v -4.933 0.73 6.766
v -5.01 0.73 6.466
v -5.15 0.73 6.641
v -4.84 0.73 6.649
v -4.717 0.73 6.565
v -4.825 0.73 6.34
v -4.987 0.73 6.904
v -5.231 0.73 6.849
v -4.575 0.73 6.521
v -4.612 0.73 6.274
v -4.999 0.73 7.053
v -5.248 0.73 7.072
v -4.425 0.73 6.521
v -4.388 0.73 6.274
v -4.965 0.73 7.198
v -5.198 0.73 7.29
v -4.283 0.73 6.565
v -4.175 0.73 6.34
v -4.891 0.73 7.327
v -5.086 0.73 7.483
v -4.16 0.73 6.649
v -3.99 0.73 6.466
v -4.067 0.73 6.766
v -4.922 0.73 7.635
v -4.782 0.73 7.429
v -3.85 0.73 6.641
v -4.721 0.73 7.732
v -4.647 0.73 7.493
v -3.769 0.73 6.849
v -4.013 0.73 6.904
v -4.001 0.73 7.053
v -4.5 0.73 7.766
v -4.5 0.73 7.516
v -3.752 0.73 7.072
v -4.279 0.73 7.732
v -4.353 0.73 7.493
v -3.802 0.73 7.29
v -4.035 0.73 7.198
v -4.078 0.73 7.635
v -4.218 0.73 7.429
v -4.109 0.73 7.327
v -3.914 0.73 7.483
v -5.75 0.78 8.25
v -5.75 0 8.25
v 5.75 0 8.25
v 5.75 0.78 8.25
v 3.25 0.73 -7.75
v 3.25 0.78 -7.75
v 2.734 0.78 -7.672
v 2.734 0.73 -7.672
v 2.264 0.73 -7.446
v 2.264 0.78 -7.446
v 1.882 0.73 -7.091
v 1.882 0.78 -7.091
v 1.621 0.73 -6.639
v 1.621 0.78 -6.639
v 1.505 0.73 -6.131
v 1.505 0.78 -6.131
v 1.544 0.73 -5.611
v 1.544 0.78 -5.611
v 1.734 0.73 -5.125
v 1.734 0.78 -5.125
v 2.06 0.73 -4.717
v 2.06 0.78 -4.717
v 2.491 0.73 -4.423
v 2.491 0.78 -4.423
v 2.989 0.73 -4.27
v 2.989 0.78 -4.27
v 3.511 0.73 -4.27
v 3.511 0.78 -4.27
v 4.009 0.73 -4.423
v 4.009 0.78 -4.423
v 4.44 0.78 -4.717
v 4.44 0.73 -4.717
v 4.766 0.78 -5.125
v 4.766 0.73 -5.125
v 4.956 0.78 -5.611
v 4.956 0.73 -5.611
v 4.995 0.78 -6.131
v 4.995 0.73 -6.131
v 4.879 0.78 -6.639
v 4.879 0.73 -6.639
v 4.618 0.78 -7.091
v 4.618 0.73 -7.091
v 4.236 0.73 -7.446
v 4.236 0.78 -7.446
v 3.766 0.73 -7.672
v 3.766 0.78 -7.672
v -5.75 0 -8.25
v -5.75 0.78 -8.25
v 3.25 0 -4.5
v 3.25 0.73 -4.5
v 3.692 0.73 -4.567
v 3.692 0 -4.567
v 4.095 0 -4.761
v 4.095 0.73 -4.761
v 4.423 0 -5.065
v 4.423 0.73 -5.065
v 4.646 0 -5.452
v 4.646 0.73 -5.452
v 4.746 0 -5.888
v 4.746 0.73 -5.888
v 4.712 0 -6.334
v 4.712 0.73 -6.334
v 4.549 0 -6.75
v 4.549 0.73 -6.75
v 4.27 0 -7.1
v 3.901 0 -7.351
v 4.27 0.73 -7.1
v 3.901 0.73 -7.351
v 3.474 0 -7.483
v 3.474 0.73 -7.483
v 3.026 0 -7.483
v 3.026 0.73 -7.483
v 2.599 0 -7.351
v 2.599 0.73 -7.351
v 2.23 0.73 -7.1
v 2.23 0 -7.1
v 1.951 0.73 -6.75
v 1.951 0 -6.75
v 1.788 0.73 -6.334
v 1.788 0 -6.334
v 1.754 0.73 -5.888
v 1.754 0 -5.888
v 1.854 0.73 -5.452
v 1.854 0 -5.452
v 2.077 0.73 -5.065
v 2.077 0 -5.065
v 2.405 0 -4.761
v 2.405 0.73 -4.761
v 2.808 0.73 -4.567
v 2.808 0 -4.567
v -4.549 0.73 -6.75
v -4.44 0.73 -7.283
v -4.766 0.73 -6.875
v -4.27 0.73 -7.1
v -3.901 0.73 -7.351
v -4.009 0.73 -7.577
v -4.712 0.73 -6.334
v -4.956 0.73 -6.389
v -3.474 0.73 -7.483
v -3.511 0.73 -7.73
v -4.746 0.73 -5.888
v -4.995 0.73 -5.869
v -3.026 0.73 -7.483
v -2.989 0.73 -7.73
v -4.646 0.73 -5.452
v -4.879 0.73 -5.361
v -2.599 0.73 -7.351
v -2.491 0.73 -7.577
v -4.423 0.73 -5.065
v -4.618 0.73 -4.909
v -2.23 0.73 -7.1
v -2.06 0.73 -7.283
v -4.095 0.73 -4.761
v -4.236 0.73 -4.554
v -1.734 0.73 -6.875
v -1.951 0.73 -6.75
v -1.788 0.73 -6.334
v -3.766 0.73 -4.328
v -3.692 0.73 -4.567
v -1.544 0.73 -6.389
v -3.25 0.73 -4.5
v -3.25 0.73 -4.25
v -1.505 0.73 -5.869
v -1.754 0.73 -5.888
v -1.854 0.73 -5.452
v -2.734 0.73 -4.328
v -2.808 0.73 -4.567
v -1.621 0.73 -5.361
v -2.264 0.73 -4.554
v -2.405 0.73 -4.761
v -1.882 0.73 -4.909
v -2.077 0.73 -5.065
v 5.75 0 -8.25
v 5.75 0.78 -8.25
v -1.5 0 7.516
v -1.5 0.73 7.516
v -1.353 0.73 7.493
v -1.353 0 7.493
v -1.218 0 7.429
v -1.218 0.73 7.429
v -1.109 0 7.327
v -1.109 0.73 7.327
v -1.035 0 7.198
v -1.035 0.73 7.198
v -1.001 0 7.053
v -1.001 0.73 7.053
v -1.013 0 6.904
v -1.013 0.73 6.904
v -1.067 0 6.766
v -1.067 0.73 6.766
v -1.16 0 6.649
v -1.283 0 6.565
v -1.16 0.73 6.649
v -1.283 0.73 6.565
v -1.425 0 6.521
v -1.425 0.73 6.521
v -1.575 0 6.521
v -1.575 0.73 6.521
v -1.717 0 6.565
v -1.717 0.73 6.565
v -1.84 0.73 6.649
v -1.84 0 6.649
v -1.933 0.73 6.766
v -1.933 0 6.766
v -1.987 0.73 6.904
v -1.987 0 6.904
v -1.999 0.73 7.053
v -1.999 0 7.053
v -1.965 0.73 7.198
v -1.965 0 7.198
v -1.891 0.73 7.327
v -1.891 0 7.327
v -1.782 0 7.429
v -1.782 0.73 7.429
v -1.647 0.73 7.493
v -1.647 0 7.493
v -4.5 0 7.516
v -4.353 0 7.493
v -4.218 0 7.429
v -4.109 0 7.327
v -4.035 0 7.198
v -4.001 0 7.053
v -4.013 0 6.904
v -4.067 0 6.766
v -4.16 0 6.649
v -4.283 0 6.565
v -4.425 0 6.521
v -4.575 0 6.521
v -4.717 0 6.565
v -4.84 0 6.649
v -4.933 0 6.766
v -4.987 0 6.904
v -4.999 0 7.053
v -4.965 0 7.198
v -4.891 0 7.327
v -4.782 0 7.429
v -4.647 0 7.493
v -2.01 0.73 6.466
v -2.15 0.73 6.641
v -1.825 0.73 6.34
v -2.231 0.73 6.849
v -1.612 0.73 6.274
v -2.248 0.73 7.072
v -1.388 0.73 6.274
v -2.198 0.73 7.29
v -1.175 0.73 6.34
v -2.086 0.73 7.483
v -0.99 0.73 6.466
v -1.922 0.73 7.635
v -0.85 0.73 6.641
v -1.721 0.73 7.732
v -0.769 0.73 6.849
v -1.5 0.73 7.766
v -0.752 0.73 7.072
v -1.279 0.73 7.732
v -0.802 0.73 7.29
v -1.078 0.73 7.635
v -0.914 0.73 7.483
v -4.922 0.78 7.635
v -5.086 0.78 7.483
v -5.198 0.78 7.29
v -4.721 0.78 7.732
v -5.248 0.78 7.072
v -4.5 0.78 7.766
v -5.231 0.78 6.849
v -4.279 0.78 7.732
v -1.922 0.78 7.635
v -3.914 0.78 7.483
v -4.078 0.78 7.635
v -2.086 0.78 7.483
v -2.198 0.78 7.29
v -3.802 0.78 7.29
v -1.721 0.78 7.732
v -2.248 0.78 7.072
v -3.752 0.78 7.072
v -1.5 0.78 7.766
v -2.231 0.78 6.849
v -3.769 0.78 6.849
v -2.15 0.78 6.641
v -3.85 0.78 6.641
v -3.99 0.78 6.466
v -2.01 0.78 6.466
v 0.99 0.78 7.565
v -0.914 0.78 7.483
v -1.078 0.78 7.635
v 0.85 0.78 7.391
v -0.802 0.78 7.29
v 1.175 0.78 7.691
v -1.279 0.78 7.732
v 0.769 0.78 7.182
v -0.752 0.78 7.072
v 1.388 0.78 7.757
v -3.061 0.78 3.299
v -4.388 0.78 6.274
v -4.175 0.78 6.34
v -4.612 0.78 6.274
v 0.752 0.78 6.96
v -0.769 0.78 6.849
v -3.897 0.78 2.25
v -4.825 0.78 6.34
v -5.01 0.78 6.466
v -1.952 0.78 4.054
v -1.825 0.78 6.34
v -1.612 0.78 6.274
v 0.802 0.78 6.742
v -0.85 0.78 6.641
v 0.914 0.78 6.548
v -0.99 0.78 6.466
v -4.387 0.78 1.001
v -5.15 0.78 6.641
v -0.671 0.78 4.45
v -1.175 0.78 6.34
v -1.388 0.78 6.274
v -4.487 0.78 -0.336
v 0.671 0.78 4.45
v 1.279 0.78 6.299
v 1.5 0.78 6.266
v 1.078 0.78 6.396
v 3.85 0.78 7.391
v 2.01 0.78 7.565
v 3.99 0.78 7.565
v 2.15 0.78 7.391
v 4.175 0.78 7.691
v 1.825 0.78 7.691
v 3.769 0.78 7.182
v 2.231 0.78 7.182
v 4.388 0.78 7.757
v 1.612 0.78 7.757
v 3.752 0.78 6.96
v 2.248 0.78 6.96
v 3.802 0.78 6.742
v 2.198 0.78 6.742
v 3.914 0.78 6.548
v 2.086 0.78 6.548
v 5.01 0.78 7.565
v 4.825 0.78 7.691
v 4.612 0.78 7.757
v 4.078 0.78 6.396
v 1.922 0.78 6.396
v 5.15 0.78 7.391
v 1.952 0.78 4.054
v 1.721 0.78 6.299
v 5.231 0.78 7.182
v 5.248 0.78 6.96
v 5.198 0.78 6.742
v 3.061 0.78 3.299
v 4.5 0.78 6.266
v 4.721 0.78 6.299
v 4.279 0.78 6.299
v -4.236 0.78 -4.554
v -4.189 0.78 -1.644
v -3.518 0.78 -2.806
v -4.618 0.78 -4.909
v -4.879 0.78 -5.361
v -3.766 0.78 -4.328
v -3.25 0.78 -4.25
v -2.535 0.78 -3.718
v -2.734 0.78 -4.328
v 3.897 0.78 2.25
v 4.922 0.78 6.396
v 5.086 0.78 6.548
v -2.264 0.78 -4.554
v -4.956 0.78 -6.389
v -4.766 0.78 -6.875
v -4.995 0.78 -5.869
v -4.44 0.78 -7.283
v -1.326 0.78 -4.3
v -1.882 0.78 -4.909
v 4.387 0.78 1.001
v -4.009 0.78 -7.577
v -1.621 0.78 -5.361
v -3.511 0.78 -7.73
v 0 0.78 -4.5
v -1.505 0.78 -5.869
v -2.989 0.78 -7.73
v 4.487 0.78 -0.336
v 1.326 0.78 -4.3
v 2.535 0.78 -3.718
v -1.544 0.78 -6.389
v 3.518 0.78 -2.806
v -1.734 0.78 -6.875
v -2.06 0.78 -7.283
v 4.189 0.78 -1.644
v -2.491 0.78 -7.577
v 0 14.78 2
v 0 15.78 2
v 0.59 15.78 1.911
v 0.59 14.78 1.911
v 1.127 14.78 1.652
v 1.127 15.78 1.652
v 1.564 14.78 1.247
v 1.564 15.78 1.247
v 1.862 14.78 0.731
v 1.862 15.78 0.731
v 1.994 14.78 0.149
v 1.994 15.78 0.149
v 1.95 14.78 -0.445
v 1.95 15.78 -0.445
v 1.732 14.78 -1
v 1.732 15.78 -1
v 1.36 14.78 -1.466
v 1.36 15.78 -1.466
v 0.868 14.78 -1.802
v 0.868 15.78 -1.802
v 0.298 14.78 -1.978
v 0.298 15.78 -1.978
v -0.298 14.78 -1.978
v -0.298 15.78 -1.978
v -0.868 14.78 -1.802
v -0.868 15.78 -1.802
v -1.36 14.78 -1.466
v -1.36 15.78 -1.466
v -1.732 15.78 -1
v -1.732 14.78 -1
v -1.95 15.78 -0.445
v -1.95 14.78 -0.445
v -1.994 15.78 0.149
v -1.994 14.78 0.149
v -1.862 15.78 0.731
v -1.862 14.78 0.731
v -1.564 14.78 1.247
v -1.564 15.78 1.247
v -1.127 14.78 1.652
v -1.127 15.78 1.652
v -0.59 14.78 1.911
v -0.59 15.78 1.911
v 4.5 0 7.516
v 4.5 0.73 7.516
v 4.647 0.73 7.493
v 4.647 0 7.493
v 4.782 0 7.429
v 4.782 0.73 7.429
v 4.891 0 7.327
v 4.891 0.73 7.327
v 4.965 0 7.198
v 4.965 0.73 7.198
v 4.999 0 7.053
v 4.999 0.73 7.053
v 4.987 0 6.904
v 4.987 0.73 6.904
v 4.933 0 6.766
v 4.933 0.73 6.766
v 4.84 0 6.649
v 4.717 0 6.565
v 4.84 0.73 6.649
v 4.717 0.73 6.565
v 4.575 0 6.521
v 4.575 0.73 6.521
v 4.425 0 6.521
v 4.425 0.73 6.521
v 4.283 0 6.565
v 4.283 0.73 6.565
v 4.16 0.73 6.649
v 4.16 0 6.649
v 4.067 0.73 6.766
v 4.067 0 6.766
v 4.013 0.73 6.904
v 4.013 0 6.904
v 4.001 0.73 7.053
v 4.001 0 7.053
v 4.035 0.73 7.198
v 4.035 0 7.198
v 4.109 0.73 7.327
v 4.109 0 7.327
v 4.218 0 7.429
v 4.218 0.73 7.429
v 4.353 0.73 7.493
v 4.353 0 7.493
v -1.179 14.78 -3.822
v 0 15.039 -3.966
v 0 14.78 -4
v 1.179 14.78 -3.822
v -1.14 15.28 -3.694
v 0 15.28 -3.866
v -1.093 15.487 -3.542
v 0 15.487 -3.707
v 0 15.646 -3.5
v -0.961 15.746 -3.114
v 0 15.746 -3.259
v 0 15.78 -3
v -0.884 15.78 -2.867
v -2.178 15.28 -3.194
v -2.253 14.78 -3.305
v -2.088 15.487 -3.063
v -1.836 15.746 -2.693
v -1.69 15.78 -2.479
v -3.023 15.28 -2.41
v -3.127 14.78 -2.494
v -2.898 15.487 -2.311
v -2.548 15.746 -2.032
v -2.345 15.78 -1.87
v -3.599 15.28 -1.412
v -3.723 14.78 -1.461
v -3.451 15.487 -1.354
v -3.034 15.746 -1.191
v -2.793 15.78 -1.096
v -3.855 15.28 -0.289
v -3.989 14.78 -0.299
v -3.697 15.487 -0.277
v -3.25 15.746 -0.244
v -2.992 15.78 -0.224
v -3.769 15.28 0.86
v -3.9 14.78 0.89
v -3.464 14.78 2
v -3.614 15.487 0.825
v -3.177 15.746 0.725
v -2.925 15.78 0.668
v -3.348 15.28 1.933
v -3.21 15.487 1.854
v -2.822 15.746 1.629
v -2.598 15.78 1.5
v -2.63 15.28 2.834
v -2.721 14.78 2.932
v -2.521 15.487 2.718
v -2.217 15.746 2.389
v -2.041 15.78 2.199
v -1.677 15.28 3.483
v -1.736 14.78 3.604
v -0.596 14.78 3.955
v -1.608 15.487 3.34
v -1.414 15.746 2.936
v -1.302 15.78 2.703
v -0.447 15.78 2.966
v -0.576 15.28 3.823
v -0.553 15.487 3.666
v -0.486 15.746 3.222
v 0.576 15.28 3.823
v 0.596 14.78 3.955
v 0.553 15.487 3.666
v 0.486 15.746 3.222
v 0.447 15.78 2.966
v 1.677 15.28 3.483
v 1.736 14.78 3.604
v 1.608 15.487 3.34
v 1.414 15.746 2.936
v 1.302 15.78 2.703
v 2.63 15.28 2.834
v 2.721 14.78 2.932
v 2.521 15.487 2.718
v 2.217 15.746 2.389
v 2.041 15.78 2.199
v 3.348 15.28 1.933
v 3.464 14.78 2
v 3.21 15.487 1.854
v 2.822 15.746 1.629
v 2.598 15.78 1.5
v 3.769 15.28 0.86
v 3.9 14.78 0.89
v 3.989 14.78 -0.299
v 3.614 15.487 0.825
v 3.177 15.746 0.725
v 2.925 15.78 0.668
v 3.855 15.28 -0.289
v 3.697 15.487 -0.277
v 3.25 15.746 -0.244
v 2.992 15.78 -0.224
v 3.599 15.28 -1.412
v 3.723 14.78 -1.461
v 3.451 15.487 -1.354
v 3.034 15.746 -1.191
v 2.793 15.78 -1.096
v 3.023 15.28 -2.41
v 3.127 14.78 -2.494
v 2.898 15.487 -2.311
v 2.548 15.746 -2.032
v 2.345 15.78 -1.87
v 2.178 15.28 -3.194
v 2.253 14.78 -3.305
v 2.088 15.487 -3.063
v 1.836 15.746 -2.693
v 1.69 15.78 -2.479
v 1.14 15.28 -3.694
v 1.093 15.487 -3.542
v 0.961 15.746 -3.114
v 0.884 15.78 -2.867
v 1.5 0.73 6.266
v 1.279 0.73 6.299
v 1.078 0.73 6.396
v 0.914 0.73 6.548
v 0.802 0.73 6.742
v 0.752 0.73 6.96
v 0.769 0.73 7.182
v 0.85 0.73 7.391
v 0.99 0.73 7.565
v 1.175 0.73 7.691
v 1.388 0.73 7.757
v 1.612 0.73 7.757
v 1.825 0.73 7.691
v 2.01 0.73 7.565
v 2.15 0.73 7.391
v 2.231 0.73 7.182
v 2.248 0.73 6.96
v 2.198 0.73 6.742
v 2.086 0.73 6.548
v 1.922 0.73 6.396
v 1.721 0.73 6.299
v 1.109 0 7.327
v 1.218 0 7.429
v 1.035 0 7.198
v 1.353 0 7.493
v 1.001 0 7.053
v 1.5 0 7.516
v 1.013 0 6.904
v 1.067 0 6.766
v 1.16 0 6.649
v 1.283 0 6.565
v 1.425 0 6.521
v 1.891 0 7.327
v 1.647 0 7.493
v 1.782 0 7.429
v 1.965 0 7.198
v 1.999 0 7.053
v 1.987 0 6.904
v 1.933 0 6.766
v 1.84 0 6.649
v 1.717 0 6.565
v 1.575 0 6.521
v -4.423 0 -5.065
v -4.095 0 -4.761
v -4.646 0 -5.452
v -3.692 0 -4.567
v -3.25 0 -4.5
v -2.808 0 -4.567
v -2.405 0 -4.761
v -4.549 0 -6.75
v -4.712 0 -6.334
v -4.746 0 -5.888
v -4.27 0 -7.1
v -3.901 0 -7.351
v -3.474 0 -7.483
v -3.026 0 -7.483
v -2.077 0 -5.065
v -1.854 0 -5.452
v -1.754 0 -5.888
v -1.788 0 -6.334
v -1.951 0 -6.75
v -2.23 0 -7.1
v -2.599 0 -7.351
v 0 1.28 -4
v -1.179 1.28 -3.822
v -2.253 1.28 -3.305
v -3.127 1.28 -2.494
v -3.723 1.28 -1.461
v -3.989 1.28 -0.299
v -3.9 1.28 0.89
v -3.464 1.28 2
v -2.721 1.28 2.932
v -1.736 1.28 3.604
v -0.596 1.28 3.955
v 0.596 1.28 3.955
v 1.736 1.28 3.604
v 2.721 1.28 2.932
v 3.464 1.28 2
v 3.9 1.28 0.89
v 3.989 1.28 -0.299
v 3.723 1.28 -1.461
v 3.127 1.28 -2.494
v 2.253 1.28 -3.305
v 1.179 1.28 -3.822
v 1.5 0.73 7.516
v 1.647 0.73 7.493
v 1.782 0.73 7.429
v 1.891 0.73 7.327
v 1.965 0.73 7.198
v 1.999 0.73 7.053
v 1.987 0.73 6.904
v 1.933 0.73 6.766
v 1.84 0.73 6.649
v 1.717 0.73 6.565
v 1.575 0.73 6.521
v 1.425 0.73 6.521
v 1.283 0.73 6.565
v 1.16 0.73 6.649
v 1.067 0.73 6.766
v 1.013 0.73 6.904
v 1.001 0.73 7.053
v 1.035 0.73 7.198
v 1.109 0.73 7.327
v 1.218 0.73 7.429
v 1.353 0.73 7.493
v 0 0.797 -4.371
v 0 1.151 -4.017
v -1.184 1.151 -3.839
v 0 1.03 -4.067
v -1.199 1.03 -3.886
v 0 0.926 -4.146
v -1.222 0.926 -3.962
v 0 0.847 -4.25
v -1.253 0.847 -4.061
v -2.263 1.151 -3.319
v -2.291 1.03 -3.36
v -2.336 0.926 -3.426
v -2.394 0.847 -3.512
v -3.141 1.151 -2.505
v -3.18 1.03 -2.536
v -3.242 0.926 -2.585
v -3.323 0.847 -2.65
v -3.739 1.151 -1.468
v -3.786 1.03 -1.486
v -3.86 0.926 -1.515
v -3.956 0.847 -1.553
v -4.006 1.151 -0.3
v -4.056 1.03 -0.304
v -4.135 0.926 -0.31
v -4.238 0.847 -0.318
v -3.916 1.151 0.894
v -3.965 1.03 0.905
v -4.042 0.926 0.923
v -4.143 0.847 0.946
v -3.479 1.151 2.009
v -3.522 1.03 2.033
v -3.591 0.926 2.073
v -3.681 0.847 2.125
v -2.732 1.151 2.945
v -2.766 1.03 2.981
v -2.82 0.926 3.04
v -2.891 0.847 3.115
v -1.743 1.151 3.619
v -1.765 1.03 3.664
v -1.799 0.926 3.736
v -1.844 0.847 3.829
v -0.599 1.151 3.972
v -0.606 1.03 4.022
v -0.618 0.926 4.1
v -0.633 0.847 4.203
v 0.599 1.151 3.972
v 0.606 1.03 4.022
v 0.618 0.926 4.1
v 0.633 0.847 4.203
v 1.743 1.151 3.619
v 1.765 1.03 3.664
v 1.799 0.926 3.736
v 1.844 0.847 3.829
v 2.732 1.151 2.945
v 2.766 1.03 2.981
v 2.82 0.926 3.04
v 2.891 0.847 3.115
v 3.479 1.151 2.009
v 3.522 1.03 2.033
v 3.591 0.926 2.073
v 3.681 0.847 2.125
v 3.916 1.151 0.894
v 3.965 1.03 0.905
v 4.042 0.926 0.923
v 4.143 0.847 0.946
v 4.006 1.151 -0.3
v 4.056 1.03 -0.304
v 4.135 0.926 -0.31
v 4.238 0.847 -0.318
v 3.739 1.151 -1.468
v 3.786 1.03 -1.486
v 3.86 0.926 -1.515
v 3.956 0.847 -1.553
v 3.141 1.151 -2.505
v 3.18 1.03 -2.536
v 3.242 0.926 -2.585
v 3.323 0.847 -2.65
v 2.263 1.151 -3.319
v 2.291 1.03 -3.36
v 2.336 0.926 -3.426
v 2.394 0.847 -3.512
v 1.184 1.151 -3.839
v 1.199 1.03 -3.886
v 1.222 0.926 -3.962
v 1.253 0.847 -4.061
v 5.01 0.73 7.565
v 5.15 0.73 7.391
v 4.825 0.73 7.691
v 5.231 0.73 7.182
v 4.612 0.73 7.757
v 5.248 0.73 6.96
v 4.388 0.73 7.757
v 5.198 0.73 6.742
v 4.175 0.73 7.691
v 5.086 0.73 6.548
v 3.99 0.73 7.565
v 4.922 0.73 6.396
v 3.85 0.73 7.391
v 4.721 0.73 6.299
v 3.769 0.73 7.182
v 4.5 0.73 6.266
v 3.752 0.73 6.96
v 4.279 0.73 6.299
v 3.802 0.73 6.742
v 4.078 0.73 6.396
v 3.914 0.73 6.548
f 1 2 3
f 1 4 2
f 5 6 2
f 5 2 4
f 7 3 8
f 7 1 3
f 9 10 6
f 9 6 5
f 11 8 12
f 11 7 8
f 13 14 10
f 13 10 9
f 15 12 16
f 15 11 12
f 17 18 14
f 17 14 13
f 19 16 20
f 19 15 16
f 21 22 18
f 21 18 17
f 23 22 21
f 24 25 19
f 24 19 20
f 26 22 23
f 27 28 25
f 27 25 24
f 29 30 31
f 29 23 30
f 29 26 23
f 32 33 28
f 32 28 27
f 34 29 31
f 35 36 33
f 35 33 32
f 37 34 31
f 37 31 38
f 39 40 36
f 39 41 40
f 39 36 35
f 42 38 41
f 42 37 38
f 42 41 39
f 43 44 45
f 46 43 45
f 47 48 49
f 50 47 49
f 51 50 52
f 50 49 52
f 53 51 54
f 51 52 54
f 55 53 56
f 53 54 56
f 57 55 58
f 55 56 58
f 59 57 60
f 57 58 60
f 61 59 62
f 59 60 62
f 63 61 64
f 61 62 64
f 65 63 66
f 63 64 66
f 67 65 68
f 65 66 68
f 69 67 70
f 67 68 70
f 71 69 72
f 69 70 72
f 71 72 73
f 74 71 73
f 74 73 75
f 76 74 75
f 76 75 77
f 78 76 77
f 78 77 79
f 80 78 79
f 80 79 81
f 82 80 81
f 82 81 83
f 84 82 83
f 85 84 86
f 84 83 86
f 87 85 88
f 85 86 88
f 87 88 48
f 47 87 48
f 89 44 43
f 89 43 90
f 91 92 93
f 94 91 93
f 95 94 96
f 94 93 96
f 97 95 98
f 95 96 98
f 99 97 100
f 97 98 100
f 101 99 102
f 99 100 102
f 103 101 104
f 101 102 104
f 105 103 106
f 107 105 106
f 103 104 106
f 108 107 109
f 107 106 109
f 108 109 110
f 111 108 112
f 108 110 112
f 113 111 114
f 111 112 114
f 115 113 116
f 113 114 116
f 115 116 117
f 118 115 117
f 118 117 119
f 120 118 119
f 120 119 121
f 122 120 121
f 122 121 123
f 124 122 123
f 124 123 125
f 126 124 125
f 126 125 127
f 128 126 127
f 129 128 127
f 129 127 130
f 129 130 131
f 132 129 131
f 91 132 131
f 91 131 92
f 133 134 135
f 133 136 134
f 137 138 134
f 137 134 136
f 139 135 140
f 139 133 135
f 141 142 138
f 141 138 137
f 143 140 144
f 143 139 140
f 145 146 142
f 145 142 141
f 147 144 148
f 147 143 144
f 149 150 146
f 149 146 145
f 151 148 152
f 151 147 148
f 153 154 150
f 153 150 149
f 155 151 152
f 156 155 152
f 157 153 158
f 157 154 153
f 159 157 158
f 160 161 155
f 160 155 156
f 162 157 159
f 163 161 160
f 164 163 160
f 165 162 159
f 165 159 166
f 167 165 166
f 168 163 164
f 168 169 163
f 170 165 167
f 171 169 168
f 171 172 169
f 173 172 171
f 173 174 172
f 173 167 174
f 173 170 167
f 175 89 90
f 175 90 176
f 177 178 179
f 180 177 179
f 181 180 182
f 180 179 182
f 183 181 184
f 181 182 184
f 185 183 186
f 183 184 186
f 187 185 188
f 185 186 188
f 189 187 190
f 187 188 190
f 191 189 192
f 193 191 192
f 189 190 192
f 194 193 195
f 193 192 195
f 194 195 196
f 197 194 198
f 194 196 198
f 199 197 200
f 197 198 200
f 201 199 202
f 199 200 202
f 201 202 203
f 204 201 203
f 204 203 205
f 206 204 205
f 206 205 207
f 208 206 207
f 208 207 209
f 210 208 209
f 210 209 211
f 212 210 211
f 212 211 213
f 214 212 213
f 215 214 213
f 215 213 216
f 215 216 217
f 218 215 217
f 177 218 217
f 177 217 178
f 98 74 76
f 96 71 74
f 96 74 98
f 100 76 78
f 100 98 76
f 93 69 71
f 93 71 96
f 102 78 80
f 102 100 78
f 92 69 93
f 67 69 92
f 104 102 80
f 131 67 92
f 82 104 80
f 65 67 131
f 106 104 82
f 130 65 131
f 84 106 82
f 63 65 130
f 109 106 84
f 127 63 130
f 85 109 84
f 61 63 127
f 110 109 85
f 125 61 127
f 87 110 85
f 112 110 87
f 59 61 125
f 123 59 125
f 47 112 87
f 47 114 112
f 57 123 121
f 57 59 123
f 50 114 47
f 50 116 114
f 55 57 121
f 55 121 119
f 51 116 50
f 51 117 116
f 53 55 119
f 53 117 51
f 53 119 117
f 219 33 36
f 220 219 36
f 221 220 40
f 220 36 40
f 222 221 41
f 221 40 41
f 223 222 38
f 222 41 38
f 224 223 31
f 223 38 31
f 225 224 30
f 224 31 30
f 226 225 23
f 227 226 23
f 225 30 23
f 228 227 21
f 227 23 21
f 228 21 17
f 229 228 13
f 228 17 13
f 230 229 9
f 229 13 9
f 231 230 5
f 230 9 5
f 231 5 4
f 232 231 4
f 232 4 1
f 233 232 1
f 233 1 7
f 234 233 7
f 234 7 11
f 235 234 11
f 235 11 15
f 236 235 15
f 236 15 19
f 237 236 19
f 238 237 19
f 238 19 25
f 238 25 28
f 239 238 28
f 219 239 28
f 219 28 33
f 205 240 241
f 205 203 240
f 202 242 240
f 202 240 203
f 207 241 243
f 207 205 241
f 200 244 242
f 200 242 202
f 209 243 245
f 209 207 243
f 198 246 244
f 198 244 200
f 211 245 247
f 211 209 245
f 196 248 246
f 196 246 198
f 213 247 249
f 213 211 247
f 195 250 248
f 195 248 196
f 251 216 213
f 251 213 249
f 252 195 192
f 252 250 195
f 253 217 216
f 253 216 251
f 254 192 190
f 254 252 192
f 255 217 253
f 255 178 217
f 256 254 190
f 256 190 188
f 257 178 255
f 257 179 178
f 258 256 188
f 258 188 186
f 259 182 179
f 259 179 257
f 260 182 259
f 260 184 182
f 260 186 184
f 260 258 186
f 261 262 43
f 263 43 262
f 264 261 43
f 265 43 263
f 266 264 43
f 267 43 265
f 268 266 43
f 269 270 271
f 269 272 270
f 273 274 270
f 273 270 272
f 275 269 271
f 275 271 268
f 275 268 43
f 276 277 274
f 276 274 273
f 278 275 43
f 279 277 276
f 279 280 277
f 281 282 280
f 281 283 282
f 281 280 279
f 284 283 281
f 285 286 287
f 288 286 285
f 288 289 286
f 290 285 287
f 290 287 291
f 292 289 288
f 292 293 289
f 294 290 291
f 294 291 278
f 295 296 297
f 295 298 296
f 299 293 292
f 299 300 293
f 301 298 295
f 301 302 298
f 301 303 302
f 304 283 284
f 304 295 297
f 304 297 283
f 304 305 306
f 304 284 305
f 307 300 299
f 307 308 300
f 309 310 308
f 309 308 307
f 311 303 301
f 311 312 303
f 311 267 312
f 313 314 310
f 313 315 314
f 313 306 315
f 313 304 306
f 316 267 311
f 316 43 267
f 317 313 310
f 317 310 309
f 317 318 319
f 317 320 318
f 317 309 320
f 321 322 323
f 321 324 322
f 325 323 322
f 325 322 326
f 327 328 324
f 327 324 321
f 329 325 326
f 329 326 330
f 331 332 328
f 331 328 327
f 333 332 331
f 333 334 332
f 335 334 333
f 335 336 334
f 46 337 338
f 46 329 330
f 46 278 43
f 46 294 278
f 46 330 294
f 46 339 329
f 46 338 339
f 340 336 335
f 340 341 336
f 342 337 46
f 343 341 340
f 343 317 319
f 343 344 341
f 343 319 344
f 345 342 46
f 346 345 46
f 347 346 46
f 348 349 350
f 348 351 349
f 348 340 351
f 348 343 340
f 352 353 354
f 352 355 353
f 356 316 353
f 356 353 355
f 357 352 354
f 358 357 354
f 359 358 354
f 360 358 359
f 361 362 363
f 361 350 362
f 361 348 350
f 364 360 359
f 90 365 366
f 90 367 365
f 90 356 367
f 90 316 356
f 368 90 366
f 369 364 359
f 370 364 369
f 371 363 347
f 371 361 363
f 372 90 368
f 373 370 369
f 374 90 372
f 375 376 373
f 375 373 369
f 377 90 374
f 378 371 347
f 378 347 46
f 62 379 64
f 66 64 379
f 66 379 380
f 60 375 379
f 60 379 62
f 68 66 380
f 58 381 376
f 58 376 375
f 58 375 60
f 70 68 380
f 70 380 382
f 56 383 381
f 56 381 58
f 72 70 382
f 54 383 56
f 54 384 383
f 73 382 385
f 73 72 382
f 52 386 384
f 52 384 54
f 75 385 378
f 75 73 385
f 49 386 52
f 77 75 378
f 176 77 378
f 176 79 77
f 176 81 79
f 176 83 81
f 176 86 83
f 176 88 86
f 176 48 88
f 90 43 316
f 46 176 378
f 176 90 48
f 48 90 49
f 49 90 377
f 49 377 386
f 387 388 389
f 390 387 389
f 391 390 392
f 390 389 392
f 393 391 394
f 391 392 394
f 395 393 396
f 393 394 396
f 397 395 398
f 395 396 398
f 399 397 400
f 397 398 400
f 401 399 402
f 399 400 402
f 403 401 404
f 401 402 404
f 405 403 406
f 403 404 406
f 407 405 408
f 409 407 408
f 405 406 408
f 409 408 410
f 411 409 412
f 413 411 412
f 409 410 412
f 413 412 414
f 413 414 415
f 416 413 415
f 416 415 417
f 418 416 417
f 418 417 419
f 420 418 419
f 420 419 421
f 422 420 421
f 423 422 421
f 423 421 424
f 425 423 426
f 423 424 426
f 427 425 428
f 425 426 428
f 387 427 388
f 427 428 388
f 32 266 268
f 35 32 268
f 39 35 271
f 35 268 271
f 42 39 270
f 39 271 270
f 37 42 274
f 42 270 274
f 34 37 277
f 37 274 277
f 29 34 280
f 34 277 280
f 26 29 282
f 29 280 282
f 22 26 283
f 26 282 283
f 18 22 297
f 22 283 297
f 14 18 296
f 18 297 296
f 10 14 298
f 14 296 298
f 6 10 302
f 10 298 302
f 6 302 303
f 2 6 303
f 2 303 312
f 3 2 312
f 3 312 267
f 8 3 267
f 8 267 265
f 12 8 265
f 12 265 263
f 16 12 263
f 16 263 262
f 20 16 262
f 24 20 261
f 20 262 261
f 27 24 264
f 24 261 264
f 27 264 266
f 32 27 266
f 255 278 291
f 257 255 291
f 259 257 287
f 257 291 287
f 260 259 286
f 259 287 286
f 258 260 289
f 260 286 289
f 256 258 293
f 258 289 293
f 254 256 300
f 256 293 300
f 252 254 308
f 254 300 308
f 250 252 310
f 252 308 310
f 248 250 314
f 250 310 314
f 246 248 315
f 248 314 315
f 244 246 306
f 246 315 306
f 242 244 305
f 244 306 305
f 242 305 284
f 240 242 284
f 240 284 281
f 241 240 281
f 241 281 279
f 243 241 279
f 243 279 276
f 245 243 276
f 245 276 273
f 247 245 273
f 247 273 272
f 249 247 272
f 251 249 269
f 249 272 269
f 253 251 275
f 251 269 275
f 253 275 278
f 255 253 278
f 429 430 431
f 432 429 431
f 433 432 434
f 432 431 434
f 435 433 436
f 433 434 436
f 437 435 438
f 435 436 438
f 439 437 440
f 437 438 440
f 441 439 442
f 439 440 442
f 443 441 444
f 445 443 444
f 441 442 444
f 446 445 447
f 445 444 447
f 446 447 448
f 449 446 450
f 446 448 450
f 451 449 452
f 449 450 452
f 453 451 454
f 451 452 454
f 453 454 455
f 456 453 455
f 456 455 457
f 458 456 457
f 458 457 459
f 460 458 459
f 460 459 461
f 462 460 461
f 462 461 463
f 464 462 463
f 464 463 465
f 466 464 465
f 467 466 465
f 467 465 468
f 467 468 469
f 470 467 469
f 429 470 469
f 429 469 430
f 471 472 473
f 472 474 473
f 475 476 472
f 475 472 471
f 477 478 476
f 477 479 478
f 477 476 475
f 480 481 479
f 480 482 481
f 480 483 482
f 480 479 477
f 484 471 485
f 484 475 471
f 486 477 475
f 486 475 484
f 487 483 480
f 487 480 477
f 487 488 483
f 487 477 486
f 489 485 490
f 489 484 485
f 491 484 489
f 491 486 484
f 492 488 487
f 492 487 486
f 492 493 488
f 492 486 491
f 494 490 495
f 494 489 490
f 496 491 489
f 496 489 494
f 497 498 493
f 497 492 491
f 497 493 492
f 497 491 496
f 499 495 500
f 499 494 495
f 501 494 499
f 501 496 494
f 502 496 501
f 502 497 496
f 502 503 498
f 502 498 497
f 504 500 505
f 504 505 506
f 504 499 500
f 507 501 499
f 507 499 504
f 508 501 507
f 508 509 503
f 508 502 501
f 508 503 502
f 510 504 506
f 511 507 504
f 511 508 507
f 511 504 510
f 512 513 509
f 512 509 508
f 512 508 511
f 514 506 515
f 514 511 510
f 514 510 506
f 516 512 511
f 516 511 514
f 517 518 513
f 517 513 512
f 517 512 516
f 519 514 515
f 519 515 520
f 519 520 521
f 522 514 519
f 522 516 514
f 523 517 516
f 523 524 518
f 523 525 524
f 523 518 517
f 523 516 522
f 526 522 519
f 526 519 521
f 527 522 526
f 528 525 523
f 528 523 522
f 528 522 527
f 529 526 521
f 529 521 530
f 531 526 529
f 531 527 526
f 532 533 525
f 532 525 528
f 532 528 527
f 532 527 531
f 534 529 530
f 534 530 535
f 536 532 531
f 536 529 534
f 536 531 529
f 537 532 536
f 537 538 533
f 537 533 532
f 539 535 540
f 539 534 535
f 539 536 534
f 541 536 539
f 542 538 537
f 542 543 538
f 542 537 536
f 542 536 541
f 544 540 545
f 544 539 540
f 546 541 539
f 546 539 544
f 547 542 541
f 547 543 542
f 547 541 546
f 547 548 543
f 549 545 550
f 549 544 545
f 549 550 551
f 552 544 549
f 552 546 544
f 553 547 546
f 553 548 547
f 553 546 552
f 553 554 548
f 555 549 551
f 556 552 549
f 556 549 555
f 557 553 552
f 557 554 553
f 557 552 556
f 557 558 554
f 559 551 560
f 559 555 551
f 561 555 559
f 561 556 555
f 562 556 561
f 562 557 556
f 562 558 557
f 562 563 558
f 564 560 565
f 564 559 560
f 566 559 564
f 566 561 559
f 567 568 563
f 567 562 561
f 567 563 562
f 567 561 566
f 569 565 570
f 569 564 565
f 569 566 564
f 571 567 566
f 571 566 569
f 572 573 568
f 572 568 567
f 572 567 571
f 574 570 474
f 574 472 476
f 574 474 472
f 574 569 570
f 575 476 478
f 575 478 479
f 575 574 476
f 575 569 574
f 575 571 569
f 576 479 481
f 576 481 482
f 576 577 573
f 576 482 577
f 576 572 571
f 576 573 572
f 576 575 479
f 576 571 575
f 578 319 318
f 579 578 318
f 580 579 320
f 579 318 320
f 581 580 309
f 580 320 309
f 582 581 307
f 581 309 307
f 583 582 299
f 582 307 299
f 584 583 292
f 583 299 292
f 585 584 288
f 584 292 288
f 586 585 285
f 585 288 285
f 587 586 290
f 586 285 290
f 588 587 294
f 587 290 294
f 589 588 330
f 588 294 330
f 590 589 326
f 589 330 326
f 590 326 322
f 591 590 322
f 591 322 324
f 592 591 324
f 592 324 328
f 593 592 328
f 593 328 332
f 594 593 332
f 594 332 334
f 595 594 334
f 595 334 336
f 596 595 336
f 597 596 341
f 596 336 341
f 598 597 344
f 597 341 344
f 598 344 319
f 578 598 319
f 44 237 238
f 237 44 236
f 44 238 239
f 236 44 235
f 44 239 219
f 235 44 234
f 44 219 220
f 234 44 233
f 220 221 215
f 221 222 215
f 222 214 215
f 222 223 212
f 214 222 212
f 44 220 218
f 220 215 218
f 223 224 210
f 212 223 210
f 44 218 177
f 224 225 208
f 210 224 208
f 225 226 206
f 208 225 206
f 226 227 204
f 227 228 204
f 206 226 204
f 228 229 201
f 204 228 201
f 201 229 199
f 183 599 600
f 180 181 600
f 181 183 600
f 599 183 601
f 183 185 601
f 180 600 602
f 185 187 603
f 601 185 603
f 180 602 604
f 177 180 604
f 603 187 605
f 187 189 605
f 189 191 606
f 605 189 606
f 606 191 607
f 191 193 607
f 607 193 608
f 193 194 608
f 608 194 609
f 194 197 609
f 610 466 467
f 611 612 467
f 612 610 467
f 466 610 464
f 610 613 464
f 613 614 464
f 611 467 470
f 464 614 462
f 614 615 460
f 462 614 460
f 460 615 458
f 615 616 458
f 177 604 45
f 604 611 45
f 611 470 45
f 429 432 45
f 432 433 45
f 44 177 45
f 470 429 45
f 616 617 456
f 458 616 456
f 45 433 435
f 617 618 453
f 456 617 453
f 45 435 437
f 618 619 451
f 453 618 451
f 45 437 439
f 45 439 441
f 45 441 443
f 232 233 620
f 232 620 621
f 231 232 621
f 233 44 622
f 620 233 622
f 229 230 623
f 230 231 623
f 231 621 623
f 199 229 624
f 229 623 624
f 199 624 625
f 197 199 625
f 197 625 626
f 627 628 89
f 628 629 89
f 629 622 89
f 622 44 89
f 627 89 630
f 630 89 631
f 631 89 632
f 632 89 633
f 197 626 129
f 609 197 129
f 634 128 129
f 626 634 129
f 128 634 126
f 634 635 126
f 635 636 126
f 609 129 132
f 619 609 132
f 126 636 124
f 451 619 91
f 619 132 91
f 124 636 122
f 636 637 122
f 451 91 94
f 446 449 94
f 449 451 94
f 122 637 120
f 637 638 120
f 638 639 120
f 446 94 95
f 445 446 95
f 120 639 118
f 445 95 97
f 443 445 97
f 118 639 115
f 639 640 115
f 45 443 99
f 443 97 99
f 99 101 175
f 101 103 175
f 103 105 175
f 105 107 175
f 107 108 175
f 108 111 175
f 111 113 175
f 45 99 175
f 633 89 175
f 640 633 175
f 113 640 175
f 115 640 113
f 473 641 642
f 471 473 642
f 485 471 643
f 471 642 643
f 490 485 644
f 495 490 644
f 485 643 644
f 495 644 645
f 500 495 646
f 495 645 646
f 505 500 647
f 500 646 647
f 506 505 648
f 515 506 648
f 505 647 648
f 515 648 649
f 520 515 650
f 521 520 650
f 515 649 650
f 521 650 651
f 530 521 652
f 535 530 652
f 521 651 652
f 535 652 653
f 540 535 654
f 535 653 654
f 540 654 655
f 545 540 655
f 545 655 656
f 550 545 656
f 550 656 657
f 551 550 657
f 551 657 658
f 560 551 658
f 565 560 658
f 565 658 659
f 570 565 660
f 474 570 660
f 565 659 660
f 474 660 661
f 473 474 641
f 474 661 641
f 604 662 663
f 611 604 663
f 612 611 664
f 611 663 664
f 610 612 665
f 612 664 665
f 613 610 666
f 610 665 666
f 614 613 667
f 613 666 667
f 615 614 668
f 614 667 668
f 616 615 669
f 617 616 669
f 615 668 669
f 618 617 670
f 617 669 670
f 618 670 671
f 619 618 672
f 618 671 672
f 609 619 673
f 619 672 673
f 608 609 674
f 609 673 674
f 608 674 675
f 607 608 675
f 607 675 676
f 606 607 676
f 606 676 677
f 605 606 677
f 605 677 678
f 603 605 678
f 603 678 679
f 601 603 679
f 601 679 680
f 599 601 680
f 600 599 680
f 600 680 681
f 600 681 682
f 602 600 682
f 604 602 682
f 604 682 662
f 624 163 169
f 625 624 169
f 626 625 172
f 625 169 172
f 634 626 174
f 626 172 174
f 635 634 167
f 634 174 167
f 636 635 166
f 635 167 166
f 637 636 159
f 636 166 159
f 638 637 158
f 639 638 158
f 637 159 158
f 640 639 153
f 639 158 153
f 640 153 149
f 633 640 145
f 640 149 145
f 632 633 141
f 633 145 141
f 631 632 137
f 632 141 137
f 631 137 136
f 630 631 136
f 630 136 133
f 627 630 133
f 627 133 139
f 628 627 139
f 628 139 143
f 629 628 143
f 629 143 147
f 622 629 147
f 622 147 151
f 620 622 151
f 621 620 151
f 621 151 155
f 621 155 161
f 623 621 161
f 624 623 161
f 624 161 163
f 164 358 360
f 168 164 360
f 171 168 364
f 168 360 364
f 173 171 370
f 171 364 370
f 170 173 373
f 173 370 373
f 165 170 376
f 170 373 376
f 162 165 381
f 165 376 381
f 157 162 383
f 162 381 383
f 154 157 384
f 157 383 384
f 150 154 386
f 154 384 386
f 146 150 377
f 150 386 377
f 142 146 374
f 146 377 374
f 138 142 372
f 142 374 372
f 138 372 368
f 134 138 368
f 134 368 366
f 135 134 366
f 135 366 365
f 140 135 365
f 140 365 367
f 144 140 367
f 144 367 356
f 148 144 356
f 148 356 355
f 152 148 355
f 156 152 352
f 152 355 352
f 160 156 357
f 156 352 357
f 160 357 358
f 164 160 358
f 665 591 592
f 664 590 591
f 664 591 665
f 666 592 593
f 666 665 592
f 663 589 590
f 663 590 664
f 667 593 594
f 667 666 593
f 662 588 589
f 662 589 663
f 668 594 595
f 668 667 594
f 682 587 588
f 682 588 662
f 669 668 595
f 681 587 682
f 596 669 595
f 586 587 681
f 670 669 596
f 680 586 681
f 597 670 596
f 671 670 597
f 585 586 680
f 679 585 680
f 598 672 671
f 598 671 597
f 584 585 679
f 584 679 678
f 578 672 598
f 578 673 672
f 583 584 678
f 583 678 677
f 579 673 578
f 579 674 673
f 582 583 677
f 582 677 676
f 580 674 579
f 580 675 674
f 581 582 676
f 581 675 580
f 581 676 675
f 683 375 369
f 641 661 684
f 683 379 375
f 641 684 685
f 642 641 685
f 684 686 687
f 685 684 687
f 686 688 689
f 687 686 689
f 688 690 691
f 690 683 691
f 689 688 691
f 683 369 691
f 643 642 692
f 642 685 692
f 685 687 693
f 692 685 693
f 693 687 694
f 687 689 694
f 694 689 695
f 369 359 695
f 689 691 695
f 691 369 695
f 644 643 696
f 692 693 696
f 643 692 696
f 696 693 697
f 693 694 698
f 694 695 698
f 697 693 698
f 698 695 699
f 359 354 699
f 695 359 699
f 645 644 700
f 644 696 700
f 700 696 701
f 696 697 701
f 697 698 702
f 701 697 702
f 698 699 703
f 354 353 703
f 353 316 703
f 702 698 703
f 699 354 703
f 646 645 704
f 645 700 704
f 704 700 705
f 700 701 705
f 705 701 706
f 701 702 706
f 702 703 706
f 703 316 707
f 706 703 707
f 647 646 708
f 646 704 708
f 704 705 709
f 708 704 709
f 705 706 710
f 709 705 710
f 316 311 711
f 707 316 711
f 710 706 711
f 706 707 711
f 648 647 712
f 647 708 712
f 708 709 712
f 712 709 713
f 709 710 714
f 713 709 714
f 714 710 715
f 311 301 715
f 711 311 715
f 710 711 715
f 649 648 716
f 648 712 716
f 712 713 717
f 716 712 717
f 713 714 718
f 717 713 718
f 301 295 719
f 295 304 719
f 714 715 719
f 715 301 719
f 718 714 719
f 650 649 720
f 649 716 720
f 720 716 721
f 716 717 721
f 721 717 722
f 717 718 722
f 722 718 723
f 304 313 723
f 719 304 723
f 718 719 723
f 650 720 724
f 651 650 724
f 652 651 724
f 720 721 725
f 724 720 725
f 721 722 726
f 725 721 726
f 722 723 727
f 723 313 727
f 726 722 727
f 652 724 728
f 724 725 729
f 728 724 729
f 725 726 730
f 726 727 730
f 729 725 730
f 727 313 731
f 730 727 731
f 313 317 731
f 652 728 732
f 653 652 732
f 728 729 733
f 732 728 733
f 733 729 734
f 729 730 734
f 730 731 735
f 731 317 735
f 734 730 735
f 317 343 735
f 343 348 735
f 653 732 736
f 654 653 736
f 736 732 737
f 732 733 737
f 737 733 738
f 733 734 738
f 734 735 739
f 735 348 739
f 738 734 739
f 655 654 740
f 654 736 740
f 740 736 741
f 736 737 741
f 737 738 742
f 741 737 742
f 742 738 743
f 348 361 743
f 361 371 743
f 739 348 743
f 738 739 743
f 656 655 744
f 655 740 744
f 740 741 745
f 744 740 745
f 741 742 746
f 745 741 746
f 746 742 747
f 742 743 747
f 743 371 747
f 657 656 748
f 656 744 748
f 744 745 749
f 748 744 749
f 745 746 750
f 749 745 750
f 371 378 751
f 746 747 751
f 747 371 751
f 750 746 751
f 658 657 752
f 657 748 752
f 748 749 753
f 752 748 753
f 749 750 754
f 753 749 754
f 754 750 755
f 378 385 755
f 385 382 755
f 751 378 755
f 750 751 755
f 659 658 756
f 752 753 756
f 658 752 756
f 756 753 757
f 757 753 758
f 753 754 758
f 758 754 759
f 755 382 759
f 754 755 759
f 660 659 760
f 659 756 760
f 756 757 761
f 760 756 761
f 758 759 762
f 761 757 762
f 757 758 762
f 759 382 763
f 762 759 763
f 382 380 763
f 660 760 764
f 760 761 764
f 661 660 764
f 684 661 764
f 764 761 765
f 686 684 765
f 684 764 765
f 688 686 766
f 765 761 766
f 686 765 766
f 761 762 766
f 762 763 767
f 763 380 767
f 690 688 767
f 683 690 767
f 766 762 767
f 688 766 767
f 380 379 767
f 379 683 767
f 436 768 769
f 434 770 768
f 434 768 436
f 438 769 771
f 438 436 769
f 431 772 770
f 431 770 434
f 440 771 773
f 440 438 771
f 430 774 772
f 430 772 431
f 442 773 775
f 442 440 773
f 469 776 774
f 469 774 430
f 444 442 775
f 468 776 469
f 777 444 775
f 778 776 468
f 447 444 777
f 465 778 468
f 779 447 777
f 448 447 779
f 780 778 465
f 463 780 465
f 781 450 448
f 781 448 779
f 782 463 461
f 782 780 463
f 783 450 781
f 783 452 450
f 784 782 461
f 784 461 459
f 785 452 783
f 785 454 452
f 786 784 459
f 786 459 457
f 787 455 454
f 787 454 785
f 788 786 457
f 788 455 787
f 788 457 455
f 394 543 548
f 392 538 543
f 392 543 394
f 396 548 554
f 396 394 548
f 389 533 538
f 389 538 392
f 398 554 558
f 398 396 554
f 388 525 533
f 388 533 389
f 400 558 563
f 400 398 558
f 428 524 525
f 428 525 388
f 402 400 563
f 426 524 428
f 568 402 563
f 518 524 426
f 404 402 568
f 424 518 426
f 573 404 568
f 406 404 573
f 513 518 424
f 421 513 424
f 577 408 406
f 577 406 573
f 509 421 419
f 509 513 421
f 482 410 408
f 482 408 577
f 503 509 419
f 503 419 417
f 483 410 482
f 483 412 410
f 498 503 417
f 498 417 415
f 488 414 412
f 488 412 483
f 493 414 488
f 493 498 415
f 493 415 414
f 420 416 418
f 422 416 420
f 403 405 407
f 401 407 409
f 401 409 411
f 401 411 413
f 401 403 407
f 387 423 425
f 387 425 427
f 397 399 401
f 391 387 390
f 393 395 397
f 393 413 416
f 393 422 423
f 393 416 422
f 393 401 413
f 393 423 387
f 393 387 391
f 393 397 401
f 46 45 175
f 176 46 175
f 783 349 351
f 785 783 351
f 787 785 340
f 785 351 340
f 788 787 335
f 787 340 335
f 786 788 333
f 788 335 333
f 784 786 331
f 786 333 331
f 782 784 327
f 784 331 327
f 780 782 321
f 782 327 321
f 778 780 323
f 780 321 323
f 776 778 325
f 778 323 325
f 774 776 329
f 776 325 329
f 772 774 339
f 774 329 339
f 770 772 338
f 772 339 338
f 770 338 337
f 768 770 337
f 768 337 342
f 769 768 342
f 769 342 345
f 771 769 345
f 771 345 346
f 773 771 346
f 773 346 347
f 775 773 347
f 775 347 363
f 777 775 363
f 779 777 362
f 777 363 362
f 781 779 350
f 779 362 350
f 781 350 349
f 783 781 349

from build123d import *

# Parameters (mm, degrees)
SKETCH1_W           = 11.5
SKETCH1_H           = 16.5
BOSS_EXTRUDE1_DEPTH = 0.78
SKETCH2_R           = 0.5
SKETCH2_R_2         = 1.5
CUT_EXTRUDE1_DEPTH  = 11.086297636
SKETCH2_3_R         = 0.75
SKETCH2_3_R_2       = 0.5
SKETCH2_3_R_3       = 1.75
SKETCH2_3_R_4       = 1.5
CUT_EXTRUDE2_DEPTH  = 0.05
SKETCH4_R           = 4
BOSS_EXTRUDE2_DEPTH = 15
FILLET1_R           = 1
FILLET2_R           = 0.5
SKETCH5_R           = 2
CUT_EXTRUDE3_DEPTH  = 1


with BuildPart() as part:
    # Sketch1 → Boss-Extrude1 (new body)
    with BuildSketch(Plane(origin=(0, 0, 0), x_dir=(1, 0, 0), z_dir=(0, 1, 0))):
        Rectangle(SKETCH1_W, SKETCH1_H)
    extrude(amount=BOSS_EXTRUDE1_DEPTH)

    # Sketch2 → Cut-Extrude1 (cut, through all)
    with BuildSketch(Plane(origin=(0, 0.78, 0), x_dir=(1, 0, 0), z_dir=(0, 1, 0))):
        with Locations((-4.5, -7.015559496)):
            Circle(SKETCH2_R)
        with Locations((-1.5, -7.015559496)):
            Circle(SKETCH2_R)
        with Locations((1.5, -7.015559496)):
            Circle(SKETCH2_R)
        with Locations((4.5, -7.015559496)):
            Circle(SKETCH2_R)
        with Locations((-3.25, 6)):
            Circle(SKETCH2_R_2)
        with Locations((3.25, 6)):
            Circle(SKETCH2_R_2)
    extrude(amount=-CUT_EXTRUDE1_DEPTH, mode=Mode.SUBTRACT)

    # Sketch2<3> → Cut-Extrude2 (cut)
    # profile 1 of 6: a face of its own
    with BuildSketch(Plane(origin=(0, 0.78, 0), x_dir=(1, 0, 0), z_dir=(0, 1, 0))):
        with Locations((-4.5, -7.015559496)):
            Circle(SKETCH2_3_R)
        with Locations((-4.5, -7.015559496)):
            Circle(SKETCH2_3_R_2, mode=Mode.SUBTRACT)
    # profile 2 of 6: a face of its own
    with BuildSketch(Plane(origin=(0, 0.78, 0), x_dir=(1, 0, 0), z_dir=(0, 1, 0))):
        with Locations((-1.5, -7.015559496)):
            Circle(SKETCH2_3_R)
        with Locations((-1.5, -7.015559496)):
            Circle(SKETCH2_3_R_2, mode=Mode.SUBTRACT)
    # profile 3 of 6: a face of its own
    with BuildSketch(Plane(origin=(0, 0.78, 0), x_dir=(1, 0, 0), z_dir=(0, 1, 0))):
        with Locations((4.5, -7.015559496)):
            Circle(SKETCH2_3_R)
        with Locations((4.5, -7.015559496)):
            Circle(SKETCH2_3_R_2, mode=Mode.SUBTRACT)
    # profile 4 of 6: a face of its own
    with BuildSketch(Plane(origin=(0, 0.78, 0), x_dir=(1, 0, 0), z_dir=(0, 1, 0))):
        with Locations((1.5, -7.015559496)):
            Circle(SKETCH2_3_R)
        with Locations((1.5, -7.015559496)):
            Circle(SKETCH2_3_R_2, mode=Mode.SUBTRACT)
    # profile 5 of 6: a face of its own
    with BuildSketch(Plane(origin=(0, 0.78, 0), x_dir=(1, 0, 0), z_dir=(0, 1, 0))):
        with Locations((-3.25, 6)):
            Circle(SKETCH2_3_R_3)
        with Locations((-3.25, 6)):
            Circle(SKETCH2_3_R_4, mode=Mode.SUBTRACT)
    # profile 6 of 6: a face of its own
    with BuildSketch(Plane(origin=(0, 0.78, 0), x_dir=(1, 0, 0), z_dir=(0, 1, 0))):
        with Locations((3.25, 6)):
            Circle(SKETCH2_3_R_3)
        with Locations((3.25, 6)):
            Circle(SKETCH2_3_R_4, mode=Mode.SUBTRACT)
    extrude(amount=-CUT_EXTRUDE2_DEPTH, mode=Mode.SUBTRACT)

    # Sketch4 → Boss-Extrude2 (add)
    with BuildSketch(Plane(origin=(0, 0.78, 0), x_dir=(1, 0, 0), z_dir=(0, 1, 0))):
        Circle(SKETCH4_R)
    extrude(amount=BOSS_EXTRUDE2_DEPTH)

    # Fillet1
    fillet1_edges = [part.edges().sort_by_distance(p)[0] for p in [
        (-4, 15.78, 0),
    ]]
    fillet(fillet1_edges, radius=FILLET1_R)

    # Fillet2
    fillet2_edges = [part.edges().sort_by_distance(p)[0] for p in [
        (-4, 0.78, 0),
    ]]
    fillet(fillet2_edges, radius=FILLET2_R)

    # Sketch5 → Cut-Extrude3 (cut)
    with BuildSketch(Plane(origin=(0, 15.78, 0), x_dir=(1, 0, 0), z_dir=(0, 1, 0))):
        Circle(SKETCH5_R)
    extrude(amount=-CUT_EXTRUDE3_DEPTH, mode=Mode.SUBTRACT)


solid = part.part
